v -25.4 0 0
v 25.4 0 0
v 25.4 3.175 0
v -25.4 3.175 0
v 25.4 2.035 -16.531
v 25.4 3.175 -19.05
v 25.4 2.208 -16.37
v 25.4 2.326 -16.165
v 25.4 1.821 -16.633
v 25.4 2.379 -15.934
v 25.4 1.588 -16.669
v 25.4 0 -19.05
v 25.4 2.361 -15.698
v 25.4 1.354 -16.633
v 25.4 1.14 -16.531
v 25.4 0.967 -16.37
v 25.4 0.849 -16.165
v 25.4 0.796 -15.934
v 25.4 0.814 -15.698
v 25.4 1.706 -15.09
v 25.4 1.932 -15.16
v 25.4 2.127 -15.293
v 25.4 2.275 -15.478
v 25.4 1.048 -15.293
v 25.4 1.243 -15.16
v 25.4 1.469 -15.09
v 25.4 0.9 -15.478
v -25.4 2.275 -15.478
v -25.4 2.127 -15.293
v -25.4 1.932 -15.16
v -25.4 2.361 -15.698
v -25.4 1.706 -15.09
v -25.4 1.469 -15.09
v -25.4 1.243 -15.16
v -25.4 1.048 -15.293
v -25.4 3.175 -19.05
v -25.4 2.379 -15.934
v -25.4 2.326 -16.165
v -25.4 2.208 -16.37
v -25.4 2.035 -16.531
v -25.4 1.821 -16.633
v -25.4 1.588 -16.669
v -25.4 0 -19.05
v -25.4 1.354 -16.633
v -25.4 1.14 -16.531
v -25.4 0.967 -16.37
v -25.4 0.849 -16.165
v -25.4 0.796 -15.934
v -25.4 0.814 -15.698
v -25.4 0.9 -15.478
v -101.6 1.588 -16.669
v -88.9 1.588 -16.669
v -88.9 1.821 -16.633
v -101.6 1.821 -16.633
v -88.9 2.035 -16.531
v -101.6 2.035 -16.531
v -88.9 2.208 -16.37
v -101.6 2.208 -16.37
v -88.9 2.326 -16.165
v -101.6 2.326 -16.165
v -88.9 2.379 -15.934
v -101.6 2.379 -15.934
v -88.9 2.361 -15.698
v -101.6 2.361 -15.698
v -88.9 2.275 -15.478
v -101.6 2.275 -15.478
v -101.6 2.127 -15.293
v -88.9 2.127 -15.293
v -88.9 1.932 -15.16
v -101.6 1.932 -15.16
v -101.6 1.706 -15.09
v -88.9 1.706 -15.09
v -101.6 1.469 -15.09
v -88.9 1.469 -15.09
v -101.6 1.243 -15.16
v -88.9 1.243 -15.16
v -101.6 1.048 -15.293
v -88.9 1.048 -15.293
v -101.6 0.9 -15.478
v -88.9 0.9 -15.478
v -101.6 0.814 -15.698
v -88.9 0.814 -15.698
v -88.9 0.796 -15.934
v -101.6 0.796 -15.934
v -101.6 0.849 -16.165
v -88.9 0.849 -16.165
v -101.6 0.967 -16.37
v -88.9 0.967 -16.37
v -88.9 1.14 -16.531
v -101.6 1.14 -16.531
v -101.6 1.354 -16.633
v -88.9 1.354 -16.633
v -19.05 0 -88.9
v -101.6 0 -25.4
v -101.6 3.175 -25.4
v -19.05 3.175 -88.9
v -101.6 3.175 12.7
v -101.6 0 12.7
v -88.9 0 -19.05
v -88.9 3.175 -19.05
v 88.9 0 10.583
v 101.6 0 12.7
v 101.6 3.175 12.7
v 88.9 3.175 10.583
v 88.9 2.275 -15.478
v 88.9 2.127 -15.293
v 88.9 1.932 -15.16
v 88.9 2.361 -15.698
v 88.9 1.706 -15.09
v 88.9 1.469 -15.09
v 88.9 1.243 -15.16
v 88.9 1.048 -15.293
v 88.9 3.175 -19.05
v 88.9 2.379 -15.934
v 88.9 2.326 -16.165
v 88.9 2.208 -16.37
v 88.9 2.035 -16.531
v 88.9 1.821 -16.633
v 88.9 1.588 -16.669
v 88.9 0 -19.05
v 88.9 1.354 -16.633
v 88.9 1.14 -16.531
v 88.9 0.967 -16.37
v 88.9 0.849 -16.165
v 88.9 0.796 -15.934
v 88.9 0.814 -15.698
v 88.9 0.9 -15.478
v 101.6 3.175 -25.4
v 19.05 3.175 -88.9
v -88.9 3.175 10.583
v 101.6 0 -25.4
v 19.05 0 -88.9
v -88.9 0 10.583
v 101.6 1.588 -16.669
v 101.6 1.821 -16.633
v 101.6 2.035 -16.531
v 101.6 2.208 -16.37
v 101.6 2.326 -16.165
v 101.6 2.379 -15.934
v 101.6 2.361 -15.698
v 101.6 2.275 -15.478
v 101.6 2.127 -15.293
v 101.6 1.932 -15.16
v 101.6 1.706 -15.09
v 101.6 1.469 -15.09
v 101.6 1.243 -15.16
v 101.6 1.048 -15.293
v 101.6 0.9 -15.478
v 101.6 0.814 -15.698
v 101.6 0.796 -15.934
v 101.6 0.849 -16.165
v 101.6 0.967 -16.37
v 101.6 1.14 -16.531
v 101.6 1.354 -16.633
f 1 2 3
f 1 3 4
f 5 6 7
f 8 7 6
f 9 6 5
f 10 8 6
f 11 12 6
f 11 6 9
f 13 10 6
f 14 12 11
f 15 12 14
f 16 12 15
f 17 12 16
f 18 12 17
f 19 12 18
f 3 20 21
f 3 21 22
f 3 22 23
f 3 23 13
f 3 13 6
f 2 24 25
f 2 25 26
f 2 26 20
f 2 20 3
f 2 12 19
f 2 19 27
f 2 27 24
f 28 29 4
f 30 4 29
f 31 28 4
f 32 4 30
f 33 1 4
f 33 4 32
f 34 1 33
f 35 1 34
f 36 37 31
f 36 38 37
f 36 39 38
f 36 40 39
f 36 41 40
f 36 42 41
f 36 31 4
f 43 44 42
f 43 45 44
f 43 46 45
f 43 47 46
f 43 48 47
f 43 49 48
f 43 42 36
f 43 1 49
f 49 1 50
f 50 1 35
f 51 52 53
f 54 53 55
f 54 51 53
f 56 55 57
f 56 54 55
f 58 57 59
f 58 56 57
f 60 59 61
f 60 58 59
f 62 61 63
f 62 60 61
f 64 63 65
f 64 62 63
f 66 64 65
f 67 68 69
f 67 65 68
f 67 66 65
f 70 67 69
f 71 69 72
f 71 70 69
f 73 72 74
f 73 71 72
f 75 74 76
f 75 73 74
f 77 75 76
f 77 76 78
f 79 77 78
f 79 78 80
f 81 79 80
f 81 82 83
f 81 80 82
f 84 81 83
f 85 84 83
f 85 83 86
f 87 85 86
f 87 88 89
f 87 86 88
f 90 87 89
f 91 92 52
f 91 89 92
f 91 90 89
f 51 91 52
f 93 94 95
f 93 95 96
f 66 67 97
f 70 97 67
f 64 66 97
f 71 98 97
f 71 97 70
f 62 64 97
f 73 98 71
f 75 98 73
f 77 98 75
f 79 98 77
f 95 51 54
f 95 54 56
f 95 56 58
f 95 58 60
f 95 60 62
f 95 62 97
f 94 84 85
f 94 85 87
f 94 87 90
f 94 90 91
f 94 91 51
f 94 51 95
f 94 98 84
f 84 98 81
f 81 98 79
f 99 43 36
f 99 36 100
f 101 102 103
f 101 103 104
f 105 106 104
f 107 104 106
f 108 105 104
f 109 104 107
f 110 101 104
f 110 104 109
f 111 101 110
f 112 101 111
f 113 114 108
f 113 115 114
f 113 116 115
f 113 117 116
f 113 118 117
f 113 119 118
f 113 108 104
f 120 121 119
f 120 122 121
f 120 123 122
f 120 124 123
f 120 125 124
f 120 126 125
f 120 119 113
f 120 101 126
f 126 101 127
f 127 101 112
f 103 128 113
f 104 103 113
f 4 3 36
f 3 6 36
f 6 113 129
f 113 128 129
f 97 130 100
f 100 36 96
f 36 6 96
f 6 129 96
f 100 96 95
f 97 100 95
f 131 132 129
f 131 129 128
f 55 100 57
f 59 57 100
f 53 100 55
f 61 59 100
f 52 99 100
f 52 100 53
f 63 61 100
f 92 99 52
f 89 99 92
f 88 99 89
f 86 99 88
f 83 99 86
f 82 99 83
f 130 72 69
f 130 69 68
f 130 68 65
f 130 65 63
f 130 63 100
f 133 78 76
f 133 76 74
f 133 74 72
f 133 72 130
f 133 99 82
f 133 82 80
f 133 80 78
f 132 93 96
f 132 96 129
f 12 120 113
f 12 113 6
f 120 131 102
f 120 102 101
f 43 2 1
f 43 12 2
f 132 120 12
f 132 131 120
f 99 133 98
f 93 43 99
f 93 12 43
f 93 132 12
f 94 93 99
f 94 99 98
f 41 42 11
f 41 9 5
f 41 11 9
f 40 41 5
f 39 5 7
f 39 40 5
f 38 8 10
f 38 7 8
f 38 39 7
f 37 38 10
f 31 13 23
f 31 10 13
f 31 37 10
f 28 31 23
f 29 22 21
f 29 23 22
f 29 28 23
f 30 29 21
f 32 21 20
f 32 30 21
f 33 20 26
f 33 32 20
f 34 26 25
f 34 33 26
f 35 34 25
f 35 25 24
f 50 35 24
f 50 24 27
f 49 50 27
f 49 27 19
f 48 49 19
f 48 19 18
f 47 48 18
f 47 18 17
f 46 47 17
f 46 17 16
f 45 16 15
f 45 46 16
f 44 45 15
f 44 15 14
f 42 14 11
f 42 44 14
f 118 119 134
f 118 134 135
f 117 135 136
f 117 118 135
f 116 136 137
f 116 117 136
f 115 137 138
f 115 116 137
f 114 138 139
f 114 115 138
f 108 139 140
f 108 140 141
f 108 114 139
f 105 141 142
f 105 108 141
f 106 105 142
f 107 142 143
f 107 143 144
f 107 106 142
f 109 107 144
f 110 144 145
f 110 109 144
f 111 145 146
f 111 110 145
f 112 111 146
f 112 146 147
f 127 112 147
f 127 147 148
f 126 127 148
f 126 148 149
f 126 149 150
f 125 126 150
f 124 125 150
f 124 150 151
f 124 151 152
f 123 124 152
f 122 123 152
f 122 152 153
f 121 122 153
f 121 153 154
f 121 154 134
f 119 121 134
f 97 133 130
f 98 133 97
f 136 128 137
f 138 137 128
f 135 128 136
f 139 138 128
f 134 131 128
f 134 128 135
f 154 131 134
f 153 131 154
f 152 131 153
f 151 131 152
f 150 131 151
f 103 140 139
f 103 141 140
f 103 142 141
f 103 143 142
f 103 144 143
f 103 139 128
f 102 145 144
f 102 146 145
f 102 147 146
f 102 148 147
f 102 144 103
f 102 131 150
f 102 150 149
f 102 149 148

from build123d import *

# Parameters (mm, degrees)
EXTRUDE1_DEPTH     = 3.175
CUT_EXTRUDE1_START = -127
SKETCH3_R          = 0.79375
CUT_EXTRUDE1_DEPTH = 203.2


with BuildPart() as part:
    # Sketch1 → Extrude1 (new body)
    with BuildSketch(Plane(origin=(0, 0, 0), x_dir=(1, 0, 0), z_dir=(0, 1, 0))):
        Polygon((25.4, 0), (-25.4, 0), (-25.4, 19.05), (-88.9, 19.05), (-88.9, -10.583333333), (-101.6, -12.7), (-101.6, 25.4), (-19.05, 88.9), (19.05, 88.9), (101.6, 25.4), (101.6, -12.7), (88.9, -10.583333333), (88.9, 19.05), (25.4, 19.05), align=None)
    extrude(amount=EXTRUDE1_DEPTH)

    # Sketch3 → Cut-Extrude1 (cut)
    with BuildSketch(Plane(origin=(25.4, 0, 0), x_dir=(0, 0, -1), z_dir=(1, 0, 0)).offset(CUT_EXTRUDE1_START)):
        with Locations((15.875, 1.5875)):
            Circle(SKETCH3_R)
    extrude(amount=CUT_EXTRUDE1_DEPTH, mode=Mode.SUBTRACT)


solid = part.part
